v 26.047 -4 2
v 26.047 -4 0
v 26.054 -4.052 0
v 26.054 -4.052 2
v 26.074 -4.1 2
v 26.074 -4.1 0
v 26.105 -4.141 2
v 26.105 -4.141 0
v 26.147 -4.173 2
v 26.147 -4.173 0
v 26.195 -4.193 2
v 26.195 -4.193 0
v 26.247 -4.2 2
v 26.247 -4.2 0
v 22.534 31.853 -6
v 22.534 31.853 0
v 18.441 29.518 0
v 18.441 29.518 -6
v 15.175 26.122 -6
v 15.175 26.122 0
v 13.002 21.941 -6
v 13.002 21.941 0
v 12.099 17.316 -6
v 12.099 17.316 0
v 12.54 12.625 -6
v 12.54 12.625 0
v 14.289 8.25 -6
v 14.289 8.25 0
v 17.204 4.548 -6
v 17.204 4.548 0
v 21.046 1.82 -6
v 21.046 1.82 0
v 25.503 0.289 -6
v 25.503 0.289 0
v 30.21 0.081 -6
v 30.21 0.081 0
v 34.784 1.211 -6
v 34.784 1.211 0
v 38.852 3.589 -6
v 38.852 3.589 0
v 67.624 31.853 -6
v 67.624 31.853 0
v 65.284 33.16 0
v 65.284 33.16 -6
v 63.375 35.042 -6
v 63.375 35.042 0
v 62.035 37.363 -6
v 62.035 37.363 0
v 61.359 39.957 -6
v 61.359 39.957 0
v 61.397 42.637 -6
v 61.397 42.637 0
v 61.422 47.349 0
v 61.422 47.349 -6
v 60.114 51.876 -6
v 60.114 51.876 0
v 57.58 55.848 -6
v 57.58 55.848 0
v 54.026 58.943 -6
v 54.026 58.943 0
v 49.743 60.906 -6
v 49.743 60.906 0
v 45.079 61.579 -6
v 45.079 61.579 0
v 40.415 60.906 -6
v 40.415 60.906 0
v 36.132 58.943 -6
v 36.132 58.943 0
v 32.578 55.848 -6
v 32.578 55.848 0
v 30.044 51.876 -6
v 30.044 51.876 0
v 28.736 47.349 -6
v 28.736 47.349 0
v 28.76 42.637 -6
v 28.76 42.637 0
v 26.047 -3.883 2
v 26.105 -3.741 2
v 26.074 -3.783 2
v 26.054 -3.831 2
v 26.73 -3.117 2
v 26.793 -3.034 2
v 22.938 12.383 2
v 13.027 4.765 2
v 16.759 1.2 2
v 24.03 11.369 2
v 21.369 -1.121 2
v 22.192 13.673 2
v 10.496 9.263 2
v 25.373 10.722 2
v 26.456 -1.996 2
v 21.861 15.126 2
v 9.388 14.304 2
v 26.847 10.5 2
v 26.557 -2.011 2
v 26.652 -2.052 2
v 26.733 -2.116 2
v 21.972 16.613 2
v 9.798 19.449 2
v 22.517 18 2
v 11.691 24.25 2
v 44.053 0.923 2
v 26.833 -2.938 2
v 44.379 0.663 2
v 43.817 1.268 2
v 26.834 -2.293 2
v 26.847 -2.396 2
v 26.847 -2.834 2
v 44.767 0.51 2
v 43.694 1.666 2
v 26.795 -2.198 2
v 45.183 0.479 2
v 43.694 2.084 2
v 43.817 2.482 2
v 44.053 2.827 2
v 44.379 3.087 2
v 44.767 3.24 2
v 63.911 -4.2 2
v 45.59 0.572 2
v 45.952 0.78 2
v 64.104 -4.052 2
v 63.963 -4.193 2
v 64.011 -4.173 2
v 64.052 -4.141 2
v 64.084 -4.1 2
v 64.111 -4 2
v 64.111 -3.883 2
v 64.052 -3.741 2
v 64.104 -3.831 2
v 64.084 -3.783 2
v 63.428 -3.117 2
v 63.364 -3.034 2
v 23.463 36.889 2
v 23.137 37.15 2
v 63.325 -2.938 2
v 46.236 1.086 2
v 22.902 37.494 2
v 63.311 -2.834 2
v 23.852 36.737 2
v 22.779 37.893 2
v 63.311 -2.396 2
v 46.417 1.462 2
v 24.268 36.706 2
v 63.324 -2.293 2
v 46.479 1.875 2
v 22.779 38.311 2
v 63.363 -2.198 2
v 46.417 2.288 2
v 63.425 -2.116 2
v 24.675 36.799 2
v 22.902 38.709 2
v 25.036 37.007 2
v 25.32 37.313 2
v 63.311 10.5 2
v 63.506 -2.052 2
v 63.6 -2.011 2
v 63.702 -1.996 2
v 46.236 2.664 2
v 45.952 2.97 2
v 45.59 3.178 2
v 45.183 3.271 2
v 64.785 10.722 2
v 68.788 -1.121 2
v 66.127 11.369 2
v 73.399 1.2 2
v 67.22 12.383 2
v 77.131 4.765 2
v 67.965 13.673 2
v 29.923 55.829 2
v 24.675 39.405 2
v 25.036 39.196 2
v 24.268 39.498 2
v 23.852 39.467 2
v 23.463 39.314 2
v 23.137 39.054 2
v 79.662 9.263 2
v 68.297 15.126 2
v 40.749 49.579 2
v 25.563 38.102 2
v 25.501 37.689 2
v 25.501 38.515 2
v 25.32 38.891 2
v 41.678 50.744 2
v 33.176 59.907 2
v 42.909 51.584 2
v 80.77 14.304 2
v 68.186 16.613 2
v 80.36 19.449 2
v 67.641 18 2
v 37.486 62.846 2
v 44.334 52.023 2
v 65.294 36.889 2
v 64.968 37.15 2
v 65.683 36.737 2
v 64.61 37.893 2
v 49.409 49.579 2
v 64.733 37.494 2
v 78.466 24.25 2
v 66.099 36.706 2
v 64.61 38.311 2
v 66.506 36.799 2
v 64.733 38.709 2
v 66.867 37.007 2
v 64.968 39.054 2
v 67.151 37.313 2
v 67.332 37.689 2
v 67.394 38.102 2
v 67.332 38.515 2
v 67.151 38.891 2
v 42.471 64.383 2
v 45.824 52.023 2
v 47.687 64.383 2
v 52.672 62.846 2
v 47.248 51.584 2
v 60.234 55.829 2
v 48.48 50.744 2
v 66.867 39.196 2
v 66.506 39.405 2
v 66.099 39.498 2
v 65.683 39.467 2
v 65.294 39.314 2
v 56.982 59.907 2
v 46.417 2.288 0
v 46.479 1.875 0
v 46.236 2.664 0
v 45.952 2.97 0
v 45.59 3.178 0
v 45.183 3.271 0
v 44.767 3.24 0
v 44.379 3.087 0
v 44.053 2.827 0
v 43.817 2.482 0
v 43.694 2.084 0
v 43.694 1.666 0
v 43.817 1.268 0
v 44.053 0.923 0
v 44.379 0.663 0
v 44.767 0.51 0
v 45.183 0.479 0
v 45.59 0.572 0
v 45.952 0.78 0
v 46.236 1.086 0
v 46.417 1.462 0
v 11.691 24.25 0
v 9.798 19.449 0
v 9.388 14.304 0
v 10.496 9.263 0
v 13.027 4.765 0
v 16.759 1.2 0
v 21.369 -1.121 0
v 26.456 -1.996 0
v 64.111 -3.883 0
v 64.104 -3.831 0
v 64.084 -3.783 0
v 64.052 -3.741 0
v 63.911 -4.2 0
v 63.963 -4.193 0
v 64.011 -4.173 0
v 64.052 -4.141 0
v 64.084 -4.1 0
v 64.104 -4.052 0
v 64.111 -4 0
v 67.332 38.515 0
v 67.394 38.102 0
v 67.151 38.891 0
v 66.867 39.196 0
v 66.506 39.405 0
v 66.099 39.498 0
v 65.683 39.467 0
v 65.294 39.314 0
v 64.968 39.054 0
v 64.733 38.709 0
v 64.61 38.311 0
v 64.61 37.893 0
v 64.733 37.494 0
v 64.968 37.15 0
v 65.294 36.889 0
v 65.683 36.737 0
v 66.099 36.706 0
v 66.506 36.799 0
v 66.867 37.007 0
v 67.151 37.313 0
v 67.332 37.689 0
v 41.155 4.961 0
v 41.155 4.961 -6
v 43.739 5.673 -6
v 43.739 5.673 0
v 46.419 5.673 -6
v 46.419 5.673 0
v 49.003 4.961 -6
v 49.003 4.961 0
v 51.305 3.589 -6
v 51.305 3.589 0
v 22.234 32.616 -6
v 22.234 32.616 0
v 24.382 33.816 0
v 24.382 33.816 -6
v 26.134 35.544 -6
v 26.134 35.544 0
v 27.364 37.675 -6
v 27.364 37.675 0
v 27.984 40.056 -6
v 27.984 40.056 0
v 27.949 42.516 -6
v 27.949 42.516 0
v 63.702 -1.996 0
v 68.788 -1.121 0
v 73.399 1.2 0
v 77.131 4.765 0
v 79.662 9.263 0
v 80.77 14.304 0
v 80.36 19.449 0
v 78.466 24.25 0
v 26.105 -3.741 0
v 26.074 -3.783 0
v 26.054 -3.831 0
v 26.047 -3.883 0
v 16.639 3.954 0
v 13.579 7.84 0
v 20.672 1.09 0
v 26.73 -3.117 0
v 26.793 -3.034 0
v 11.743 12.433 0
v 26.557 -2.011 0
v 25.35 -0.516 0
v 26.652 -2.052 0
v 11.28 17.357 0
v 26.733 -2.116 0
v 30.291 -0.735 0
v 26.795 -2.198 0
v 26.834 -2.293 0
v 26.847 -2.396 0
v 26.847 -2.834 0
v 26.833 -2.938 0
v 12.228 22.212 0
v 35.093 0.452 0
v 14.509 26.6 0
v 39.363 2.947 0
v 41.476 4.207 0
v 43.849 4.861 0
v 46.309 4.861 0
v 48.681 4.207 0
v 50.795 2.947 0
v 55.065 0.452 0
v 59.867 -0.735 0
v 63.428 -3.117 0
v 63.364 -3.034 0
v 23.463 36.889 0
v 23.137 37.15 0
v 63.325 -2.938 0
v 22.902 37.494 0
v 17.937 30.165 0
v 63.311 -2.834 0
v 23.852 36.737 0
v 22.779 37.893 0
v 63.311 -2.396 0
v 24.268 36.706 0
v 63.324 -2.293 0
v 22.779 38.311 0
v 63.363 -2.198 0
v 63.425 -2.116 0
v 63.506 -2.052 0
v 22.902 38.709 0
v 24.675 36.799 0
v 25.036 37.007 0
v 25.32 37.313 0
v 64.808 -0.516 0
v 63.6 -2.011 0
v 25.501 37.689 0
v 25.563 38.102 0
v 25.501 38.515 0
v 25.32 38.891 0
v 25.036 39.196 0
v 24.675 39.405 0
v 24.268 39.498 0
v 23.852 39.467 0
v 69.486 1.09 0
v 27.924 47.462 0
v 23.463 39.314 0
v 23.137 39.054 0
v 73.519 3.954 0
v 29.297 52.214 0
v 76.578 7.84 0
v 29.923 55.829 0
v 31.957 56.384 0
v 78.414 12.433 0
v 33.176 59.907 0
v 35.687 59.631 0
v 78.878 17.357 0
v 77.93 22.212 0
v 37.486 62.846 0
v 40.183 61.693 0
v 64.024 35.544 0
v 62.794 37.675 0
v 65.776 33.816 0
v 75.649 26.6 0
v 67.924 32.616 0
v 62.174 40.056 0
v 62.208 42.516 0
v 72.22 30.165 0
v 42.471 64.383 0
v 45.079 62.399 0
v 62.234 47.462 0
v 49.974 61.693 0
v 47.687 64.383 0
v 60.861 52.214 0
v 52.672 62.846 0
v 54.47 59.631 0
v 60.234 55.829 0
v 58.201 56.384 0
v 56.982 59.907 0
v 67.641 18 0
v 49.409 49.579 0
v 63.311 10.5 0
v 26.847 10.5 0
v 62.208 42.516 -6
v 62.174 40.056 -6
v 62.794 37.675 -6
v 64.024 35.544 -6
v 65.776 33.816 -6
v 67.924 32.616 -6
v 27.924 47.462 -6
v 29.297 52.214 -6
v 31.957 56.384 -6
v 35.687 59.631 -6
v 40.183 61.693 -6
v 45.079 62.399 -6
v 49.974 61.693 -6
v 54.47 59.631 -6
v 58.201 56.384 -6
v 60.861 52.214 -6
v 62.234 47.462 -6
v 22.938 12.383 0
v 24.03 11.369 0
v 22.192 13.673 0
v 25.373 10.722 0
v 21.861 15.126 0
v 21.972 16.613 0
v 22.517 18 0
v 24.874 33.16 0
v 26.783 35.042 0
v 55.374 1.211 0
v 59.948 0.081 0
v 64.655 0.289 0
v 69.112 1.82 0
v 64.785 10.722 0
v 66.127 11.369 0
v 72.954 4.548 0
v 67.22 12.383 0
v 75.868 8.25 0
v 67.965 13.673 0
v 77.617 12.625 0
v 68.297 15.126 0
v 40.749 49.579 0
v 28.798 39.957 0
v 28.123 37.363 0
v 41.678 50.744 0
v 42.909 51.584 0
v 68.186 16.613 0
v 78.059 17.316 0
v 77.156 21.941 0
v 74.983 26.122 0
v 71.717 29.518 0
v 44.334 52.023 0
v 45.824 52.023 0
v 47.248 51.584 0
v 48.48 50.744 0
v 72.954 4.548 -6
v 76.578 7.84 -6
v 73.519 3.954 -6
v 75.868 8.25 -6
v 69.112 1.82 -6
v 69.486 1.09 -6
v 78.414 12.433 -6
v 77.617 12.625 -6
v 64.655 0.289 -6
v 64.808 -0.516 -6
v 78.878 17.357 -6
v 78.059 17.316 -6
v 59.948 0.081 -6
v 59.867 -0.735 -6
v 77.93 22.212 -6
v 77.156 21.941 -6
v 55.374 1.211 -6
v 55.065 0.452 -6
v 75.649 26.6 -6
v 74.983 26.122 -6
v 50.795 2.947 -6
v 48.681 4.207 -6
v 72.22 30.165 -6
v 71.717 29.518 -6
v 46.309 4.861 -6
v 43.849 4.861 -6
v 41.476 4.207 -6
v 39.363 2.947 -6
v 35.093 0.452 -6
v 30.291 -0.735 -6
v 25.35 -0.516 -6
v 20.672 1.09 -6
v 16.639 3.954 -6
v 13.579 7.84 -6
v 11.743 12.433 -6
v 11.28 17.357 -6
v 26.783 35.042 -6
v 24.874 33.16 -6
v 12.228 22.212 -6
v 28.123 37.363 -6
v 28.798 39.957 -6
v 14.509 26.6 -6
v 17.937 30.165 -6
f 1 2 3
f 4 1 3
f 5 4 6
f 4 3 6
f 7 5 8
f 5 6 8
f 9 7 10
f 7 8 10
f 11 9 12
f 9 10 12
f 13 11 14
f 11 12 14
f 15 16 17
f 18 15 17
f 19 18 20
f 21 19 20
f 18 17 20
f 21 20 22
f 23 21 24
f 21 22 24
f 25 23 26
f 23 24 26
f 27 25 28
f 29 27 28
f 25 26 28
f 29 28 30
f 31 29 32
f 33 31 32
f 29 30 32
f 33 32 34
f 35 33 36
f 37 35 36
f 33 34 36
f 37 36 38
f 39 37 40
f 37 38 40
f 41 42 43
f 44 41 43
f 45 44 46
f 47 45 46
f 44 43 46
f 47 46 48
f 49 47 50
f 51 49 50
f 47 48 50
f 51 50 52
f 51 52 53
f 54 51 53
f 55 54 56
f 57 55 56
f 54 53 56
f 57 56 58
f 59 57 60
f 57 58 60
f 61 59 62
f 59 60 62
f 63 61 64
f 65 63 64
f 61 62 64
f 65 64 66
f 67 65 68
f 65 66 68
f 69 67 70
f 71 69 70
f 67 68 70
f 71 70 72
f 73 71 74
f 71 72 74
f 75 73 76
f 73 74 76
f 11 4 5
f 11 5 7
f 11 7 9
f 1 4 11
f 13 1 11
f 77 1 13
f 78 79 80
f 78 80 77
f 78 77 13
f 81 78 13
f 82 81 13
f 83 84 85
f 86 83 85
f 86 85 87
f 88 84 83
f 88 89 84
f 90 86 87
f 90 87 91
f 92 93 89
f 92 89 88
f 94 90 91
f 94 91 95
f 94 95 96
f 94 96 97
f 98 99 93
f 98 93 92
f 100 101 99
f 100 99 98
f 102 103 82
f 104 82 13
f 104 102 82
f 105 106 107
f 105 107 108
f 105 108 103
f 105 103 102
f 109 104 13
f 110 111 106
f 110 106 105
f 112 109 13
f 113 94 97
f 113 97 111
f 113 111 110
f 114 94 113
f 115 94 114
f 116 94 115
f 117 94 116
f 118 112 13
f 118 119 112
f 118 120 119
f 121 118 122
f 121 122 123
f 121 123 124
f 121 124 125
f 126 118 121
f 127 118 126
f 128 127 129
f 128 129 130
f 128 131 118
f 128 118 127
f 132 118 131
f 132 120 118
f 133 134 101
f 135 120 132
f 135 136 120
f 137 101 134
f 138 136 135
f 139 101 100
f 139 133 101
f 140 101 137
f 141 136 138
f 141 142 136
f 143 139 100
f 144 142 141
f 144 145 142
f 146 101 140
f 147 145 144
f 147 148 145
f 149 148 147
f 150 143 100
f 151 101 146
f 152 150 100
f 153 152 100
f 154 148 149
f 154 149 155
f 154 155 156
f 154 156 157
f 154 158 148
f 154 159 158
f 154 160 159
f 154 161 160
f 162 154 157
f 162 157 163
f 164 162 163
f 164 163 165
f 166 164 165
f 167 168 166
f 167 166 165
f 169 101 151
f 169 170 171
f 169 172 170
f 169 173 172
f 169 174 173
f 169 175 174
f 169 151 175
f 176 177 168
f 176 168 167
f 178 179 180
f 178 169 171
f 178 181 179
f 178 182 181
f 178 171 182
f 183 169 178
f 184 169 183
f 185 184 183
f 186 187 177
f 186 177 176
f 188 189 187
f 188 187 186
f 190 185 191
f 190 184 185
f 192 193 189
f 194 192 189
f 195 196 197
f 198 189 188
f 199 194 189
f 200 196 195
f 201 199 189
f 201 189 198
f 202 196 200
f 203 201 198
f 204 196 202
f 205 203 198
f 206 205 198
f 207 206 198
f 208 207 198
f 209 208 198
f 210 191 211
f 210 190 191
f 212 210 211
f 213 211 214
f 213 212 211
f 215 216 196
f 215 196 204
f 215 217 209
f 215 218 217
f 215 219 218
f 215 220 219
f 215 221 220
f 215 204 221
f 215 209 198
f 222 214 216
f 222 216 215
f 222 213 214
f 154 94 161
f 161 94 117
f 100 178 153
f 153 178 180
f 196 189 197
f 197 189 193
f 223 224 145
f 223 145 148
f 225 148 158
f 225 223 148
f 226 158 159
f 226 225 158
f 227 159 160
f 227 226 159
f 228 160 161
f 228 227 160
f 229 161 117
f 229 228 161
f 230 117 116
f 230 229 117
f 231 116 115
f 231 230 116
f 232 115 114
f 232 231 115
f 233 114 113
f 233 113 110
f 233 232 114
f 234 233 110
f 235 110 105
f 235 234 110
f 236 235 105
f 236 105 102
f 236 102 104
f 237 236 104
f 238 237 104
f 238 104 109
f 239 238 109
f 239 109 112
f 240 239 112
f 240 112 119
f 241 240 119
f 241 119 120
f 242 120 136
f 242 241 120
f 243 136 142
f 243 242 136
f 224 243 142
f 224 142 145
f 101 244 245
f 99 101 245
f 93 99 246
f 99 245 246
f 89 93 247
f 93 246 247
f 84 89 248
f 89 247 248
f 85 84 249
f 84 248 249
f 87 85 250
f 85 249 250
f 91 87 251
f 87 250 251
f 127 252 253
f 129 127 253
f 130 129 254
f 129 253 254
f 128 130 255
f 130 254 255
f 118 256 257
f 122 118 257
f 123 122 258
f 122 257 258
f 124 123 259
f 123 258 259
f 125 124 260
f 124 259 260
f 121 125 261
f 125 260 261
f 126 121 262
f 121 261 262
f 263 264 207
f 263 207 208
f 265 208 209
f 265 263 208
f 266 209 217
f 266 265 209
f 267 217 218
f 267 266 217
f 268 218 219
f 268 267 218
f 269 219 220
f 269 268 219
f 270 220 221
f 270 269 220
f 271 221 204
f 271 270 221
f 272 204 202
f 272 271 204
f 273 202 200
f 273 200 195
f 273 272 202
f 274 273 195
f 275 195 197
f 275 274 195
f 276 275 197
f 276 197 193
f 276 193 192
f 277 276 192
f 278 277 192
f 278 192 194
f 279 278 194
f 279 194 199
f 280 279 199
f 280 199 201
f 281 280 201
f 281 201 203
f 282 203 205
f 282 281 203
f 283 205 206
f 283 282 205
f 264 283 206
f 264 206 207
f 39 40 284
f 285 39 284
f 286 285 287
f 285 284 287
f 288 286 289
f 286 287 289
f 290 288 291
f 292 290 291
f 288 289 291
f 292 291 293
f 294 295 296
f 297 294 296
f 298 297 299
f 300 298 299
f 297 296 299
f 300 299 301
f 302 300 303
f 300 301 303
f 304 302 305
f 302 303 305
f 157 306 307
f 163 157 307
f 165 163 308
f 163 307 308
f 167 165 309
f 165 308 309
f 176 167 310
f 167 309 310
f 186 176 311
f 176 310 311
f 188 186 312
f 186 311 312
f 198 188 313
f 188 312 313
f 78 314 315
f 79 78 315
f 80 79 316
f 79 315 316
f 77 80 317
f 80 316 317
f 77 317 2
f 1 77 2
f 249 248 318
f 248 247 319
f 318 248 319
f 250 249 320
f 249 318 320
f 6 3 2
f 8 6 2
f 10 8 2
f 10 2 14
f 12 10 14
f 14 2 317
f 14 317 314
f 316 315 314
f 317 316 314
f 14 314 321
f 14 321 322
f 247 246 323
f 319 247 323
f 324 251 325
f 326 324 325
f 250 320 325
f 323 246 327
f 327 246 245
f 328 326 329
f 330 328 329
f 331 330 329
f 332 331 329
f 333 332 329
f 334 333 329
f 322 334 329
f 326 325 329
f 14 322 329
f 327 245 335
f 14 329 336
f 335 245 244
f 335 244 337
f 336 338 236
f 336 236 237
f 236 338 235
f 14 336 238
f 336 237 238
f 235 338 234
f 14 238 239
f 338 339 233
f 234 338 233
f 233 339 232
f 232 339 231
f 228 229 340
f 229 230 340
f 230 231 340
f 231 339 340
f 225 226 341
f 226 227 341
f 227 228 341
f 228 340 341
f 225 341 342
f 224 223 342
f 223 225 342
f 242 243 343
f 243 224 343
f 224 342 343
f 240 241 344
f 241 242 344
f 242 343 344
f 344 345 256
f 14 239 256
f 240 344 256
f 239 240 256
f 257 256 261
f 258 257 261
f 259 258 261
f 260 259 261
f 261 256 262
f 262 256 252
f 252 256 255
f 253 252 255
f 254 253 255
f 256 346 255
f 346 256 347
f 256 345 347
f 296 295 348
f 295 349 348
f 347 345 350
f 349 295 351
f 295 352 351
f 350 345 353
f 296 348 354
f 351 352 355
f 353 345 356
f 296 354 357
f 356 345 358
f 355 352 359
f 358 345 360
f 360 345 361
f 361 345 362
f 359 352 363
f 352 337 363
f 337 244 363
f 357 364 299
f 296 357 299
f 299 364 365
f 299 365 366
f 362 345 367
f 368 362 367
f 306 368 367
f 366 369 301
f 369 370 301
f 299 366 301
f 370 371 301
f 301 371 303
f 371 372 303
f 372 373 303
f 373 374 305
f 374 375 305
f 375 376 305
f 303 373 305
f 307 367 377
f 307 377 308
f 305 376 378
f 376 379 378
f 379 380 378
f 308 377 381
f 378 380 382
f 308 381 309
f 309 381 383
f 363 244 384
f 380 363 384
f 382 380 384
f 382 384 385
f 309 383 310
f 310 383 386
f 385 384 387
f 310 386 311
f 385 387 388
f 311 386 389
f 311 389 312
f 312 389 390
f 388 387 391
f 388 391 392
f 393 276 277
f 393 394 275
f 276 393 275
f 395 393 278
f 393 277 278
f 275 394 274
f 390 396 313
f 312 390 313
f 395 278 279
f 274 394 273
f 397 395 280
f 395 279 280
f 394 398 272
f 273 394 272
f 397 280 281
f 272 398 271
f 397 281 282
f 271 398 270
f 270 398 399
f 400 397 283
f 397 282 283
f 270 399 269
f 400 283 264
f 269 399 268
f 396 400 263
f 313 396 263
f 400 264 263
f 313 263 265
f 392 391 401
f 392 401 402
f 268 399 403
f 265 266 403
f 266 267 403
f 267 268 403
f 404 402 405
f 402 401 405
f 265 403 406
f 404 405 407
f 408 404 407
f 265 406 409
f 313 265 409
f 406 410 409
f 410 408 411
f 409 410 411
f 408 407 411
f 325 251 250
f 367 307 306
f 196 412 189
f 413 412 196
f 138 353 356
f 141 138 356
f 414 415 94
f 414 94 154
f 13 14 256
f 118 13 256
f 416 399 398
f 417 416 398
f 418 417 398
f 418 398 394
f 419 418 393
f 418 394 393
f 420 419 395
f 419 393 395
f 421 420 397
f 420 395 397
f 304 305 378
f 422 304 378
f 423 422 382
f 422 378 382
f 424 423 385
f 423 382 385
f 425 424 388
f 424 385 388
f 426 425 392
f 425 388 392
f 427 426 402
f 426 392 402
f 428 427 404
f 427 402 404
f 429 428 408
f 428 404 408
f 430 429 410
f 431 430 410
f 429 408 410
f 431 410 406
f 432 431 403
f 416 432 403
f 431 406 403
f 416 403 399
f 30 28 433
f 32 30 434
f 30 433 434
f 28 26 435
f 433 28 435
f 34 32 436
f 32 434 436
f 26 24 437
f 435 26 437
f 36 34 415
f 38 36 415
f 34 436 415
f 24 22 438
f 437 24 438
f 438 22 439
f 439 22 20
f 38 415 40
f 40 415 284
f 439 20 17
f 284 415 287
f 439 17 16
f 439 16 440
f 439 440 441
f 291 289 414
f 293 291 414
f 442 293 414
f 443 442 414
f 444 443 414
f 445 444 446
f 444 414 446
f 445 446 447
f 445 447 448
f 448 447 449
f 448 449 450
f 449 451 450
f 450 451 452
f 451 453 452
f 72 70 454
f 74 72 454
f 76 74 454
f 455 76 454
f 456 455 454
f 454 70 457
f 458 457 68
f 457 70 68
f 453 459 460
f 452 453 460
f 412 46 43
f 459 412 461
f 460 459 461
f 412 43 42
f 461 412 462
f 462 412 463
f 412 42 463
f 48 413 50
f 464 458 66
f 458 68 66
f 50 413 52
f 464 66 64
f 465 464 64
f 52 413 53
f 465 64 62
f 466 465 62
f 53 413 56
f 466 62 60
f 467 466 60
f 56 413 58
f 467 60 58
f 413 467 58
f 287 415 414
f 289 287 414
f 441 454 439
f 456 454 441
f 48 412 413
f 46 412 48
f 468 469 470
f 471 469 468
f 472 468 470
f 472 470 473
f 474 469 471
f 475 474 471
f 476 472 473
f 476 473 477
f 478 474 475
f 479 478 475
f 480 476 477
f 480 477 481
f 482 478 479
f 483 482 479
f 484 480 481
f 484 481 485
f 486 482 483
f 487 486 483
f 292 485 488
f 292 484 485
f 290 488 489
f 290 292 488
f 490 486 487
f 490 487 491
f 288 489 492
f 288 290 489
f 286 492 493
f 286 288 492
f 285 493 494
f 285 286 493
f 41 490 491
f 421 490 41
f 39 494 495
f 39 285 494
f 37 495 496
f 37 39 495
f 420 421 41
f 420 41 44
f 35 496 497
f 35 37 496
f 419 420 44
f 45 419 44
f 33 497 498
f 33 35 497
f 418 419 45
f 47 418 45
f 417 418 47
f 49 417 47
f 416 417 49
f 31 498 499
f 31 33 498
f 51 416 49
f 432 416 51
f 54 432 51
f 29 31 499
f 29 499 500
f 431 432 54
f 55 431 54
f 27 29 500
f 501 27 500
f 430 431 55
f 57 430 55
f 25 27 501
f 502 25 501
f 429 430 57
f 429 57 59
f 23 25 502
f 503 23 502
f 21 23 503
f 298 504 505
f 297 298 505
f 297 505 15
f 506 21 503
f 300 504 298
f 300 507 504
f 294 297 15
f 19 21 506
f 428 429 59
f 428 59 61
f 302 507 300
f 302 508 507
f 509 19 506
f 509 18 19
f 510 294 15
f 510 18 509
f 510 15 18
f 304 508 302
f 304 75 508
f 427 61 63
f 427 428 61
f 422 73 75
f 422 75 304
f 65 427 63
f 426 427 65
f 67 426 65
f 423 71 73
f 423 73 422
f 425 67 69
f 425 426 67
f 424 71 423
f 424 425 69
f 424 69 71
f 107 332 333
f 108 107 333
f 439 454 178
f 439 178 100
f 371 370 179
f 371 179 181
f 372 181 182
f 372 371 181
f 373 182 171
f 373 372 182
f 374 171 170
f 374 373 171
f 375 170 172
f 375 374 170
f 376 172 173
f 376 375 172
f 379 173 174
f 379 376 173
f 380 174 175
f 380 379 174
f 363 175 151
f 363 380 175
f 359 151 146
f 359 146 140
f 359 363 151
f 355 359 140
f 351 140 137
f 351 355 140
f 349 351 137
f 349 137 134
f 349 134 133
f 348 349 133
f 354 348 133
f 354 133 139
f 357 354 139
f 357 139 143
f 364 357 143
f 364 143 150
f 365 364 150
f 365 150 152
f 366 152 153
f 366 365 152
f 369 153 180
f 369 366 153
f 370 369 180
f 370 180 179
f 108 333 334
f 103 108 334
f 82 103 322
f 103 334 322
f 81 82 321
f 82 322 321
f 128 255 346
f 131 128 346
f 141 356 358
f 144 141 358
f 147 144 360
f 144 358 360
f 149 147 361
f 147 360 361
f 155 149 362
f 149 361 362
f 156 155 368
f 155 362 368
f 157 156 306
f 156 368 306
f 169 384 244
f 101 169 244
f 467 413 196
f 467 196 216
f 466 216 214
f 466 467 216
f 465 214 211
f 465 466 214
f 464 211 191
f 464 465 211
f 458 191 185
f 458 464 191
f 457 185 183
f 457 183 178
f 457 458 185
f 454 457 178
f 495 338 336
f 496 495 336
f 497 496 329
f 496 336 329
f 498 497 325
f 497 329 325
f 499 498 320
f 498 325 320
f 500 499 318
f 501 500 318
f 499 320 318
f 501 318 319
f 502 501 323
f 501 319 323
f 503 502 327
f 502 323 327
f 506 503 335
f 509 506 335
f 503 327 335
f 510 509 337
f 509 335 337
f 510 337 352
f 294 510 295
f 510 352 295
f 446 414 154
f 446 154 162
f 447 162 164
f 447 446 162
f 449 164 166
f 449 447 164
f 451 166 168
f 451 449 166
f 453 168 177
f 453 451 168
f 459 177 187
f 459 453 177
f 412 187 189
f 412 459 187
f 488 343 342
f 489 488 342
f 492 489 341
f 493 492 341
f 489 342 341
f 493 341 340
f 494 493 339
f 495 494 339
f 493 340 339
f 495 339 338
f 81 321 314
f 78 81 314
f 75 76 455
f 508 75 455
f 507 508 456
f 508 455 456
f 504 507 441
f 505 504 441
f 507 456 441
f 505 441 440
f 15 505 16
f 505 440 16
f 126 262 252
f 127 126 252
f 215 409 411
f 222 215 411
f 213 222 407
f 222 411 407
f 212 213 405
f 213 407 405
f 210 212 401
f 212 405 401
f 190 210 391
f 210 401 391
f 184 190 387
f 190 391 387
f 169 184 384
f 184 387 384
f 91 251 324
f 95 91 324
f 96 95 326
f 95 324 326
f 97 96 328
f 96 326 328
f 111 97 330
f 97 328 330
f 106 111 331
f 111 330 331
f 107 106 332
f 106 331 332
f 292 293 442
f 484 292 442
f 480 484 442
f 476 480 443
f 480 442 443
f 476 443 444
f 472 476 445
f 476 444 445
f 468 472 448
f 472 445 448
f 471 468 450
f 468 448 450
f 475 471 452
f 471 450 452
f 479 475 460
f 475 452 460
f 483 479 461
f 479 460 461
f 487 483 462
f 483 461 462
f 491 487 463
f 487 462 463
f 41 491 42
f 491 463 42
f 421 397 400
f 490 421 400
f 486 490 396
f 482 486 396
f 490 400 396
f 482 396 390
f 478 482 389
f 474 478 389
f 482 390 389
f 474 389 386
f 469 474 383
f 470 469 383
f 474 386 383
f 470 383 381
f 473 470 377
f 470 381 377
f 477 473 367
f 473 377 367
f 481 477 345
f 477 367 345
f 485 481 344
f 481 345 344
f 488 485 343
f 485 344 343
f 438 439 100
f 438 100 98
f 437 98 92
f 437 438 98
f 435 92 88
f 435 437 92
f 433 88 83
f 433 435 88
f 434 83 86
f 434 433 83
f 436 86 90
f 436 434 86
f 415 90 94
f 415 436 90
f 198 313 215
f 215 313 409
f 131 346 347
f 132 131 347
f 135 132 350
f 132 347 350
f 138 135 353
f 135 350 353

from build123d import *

# Parameters (mm, degrees)
SKETCH1_R           = 1.4
BOSS_EXTRUDE1_DEPTH = 2
BOSS_EXTRUDE2_DEPTH = 6


with BuildPart() as part:
    # Sketch1 → Boss-Extrude1 (new body)
    with BuildSketch(Plane.XY):
        with BuildLine():
            Line((78.466333699, 24.25), (60.234282891, 55.828838325))
            ThreePointArc((60.234282891, 55.828838325), (45.078838325, 64.578838325), (29.923393759, 55.828838325))
            Line((29.923393759, 55.828838325), (11.691342951, 24.25))
            ThreePointArc((11.691342951, 24.25), (11.594517635, 6.919891409), (26.455726065, -1.995630053))
            ThreePointArc((26.455726065, -1.995630053), (26.732773023, -2.115865565), (26.846787517, -2.395530168))
            Line((26.846787517, -2.395530168), (26.846787517, -2.834314575))
            ThreePointArc((26.846787517, -2.834314575), (26.81633933, -2.987387948), (26.72963023, -3.117157288))
            Line((26.72963023, -3.117157288), (26.105366161, -3.741421356))
            ThreePointArc((26.105366161, -3.741421356), (26.062011611, -3.806306026), (26.046787517, -3.882842712))
            Line((26.046787517, -3.882842712), (26.046787517, -4))
            ThreePointArc((26.046787517, -4), (26.105366161, -4.141421356), (26.246787517, -4.2))
            Line((26.246787517, -4.2), (63.910889132, -4.2))
            ThreePointArc((63.910889132, -4.2), (64.052310489, -4.141421356), (64.110889132, -4))
            Line((64.110889132, -4), (64.110889132, -3.882842712))
            ThreePointArc((64.110889132, -3.882842712), (64.095665039, -3.806306026), (64.052310489, -3.741421356))
            Line((64.052310489, -3.741421356), (63.42804642, -3.117157288))
            ThreePointArc((63.42804642, -3.117157288), (63.341337319, -2.987387948), (63.310889132, -2.834314575))
            Line((63.310889132, -2.834314575), (63.310889132, -2.395530168))
            ThreePointArc((63.310889132, -2.395530168), (63.424903627, -2.115865565), (63.701950585, -1.995630053))
            ThreePointArc((63.701950585, -1.995630053), (78.563159015, 6.919891409), (78.466333699, 24.25))
        make_face()
        with Locations((65.994459855, 38.101919162)):
            Circle(SKETCH1_R, mode=Mode.SUBTRACT)
        with Locations((45.078838325, 1.875)):
            Circle(SKETCH1_R, mode=Mode.SUBTRACT)
        with Locations((24.163216795, 38.101919162)):
            Circle(SKETCH1_R, mode=Mode.SUBTRACT)
        with BuildLine():
            Line((26.846787517, 10.5), (63.310889132, 10.5))
            ThreePointArc((63.310889132, 10.5), (67.641016151, 13), (67.641016151, 18))
            Line((67.641016151, 18), (49.408965344, 49.578838325))
            ThreePointArc((49.408965344, 49.578838325), (45.078838325, 52.078838325), (40.748711306, 49.578838325))
            Line((40.748711306, 49.578838325), (22.516660498, 18))
            ThreePointArc((22.516660498, 18), (22.516660498, 13), (26.846787517, 10.5))
        make_face(mode=Mode.SUBTRACT)
    extrude(amount=BOSS_EXTRUDE1_DEPTH)

    # Sketch2 → Boss-Extrude2 (add)
    with BuildSketch(Plane(origin=(0, 0, 0), x_dir=(-1, 0, 0), z_dir=(0, 0, -1))):
        with BuildLine():
            ThreePointArc((-27.949498848, 42.516002182), (-45.078838325, 62.398838325), (-62.208177802, 42.516002182))
            ThreePointArc((-62.208177802, 42.516002182), (-63.337010114, 36.567639839), (-67.924026858, 32.615861208))
            ThreePointArc((-67.924026858, 32.615861208), (-76.578398318, 7.84), (-50.794687381, 2.946974934))
            ThreePointArc((-50.794687381, 2.946974934), (-45.078838325, 4.943558647), (-39.362989268, 2.946974934))
            ThreePointArc((-39.362989268, 2.946974934), (-13.579278331, 7.84), (-22.233649792, 32.615861208))
            ThreePointArc((-22.233649792, 32.615861208), (-26.820666536, 36.567639839), (-27.949498848, 42.516002182))
        make_face()
        with BuildLine():
            ThreePointArc((-67.623619549, 31.852870089), (-62.626869283, 36.157639839), (-61.397204455, 42.637337381))
            ThreePointArc((-61.397204455, 42.637337381), (-45.078838325, 61.578838325), (-28.760472195, 42.637337381))
            ThreePointArc((-28.760472195, 42.637337381), (-27.530807367, 36.157639839), (-22.534057101, 31.852870089))
            ThreePointArc((-22.534057101, 31.852870089), (-14.289419162, 8.25), (-38.852423231, 3.588630855))
            ThreePointArc((-38.852423231, 3.588630855), (-45.078838325, 5.763558647), (-51.305253419, 3.588630855))
            ThreePointArc((-51.305253419, 3.588630855), (-75.868257487, 8.25), (-67.623619549, 31.852870089))
        make_face(mode=Mode.SUBTRACT)
    extrude(amount=BOSS_EXTRUDE2_DEPTH)


solid = part.part
